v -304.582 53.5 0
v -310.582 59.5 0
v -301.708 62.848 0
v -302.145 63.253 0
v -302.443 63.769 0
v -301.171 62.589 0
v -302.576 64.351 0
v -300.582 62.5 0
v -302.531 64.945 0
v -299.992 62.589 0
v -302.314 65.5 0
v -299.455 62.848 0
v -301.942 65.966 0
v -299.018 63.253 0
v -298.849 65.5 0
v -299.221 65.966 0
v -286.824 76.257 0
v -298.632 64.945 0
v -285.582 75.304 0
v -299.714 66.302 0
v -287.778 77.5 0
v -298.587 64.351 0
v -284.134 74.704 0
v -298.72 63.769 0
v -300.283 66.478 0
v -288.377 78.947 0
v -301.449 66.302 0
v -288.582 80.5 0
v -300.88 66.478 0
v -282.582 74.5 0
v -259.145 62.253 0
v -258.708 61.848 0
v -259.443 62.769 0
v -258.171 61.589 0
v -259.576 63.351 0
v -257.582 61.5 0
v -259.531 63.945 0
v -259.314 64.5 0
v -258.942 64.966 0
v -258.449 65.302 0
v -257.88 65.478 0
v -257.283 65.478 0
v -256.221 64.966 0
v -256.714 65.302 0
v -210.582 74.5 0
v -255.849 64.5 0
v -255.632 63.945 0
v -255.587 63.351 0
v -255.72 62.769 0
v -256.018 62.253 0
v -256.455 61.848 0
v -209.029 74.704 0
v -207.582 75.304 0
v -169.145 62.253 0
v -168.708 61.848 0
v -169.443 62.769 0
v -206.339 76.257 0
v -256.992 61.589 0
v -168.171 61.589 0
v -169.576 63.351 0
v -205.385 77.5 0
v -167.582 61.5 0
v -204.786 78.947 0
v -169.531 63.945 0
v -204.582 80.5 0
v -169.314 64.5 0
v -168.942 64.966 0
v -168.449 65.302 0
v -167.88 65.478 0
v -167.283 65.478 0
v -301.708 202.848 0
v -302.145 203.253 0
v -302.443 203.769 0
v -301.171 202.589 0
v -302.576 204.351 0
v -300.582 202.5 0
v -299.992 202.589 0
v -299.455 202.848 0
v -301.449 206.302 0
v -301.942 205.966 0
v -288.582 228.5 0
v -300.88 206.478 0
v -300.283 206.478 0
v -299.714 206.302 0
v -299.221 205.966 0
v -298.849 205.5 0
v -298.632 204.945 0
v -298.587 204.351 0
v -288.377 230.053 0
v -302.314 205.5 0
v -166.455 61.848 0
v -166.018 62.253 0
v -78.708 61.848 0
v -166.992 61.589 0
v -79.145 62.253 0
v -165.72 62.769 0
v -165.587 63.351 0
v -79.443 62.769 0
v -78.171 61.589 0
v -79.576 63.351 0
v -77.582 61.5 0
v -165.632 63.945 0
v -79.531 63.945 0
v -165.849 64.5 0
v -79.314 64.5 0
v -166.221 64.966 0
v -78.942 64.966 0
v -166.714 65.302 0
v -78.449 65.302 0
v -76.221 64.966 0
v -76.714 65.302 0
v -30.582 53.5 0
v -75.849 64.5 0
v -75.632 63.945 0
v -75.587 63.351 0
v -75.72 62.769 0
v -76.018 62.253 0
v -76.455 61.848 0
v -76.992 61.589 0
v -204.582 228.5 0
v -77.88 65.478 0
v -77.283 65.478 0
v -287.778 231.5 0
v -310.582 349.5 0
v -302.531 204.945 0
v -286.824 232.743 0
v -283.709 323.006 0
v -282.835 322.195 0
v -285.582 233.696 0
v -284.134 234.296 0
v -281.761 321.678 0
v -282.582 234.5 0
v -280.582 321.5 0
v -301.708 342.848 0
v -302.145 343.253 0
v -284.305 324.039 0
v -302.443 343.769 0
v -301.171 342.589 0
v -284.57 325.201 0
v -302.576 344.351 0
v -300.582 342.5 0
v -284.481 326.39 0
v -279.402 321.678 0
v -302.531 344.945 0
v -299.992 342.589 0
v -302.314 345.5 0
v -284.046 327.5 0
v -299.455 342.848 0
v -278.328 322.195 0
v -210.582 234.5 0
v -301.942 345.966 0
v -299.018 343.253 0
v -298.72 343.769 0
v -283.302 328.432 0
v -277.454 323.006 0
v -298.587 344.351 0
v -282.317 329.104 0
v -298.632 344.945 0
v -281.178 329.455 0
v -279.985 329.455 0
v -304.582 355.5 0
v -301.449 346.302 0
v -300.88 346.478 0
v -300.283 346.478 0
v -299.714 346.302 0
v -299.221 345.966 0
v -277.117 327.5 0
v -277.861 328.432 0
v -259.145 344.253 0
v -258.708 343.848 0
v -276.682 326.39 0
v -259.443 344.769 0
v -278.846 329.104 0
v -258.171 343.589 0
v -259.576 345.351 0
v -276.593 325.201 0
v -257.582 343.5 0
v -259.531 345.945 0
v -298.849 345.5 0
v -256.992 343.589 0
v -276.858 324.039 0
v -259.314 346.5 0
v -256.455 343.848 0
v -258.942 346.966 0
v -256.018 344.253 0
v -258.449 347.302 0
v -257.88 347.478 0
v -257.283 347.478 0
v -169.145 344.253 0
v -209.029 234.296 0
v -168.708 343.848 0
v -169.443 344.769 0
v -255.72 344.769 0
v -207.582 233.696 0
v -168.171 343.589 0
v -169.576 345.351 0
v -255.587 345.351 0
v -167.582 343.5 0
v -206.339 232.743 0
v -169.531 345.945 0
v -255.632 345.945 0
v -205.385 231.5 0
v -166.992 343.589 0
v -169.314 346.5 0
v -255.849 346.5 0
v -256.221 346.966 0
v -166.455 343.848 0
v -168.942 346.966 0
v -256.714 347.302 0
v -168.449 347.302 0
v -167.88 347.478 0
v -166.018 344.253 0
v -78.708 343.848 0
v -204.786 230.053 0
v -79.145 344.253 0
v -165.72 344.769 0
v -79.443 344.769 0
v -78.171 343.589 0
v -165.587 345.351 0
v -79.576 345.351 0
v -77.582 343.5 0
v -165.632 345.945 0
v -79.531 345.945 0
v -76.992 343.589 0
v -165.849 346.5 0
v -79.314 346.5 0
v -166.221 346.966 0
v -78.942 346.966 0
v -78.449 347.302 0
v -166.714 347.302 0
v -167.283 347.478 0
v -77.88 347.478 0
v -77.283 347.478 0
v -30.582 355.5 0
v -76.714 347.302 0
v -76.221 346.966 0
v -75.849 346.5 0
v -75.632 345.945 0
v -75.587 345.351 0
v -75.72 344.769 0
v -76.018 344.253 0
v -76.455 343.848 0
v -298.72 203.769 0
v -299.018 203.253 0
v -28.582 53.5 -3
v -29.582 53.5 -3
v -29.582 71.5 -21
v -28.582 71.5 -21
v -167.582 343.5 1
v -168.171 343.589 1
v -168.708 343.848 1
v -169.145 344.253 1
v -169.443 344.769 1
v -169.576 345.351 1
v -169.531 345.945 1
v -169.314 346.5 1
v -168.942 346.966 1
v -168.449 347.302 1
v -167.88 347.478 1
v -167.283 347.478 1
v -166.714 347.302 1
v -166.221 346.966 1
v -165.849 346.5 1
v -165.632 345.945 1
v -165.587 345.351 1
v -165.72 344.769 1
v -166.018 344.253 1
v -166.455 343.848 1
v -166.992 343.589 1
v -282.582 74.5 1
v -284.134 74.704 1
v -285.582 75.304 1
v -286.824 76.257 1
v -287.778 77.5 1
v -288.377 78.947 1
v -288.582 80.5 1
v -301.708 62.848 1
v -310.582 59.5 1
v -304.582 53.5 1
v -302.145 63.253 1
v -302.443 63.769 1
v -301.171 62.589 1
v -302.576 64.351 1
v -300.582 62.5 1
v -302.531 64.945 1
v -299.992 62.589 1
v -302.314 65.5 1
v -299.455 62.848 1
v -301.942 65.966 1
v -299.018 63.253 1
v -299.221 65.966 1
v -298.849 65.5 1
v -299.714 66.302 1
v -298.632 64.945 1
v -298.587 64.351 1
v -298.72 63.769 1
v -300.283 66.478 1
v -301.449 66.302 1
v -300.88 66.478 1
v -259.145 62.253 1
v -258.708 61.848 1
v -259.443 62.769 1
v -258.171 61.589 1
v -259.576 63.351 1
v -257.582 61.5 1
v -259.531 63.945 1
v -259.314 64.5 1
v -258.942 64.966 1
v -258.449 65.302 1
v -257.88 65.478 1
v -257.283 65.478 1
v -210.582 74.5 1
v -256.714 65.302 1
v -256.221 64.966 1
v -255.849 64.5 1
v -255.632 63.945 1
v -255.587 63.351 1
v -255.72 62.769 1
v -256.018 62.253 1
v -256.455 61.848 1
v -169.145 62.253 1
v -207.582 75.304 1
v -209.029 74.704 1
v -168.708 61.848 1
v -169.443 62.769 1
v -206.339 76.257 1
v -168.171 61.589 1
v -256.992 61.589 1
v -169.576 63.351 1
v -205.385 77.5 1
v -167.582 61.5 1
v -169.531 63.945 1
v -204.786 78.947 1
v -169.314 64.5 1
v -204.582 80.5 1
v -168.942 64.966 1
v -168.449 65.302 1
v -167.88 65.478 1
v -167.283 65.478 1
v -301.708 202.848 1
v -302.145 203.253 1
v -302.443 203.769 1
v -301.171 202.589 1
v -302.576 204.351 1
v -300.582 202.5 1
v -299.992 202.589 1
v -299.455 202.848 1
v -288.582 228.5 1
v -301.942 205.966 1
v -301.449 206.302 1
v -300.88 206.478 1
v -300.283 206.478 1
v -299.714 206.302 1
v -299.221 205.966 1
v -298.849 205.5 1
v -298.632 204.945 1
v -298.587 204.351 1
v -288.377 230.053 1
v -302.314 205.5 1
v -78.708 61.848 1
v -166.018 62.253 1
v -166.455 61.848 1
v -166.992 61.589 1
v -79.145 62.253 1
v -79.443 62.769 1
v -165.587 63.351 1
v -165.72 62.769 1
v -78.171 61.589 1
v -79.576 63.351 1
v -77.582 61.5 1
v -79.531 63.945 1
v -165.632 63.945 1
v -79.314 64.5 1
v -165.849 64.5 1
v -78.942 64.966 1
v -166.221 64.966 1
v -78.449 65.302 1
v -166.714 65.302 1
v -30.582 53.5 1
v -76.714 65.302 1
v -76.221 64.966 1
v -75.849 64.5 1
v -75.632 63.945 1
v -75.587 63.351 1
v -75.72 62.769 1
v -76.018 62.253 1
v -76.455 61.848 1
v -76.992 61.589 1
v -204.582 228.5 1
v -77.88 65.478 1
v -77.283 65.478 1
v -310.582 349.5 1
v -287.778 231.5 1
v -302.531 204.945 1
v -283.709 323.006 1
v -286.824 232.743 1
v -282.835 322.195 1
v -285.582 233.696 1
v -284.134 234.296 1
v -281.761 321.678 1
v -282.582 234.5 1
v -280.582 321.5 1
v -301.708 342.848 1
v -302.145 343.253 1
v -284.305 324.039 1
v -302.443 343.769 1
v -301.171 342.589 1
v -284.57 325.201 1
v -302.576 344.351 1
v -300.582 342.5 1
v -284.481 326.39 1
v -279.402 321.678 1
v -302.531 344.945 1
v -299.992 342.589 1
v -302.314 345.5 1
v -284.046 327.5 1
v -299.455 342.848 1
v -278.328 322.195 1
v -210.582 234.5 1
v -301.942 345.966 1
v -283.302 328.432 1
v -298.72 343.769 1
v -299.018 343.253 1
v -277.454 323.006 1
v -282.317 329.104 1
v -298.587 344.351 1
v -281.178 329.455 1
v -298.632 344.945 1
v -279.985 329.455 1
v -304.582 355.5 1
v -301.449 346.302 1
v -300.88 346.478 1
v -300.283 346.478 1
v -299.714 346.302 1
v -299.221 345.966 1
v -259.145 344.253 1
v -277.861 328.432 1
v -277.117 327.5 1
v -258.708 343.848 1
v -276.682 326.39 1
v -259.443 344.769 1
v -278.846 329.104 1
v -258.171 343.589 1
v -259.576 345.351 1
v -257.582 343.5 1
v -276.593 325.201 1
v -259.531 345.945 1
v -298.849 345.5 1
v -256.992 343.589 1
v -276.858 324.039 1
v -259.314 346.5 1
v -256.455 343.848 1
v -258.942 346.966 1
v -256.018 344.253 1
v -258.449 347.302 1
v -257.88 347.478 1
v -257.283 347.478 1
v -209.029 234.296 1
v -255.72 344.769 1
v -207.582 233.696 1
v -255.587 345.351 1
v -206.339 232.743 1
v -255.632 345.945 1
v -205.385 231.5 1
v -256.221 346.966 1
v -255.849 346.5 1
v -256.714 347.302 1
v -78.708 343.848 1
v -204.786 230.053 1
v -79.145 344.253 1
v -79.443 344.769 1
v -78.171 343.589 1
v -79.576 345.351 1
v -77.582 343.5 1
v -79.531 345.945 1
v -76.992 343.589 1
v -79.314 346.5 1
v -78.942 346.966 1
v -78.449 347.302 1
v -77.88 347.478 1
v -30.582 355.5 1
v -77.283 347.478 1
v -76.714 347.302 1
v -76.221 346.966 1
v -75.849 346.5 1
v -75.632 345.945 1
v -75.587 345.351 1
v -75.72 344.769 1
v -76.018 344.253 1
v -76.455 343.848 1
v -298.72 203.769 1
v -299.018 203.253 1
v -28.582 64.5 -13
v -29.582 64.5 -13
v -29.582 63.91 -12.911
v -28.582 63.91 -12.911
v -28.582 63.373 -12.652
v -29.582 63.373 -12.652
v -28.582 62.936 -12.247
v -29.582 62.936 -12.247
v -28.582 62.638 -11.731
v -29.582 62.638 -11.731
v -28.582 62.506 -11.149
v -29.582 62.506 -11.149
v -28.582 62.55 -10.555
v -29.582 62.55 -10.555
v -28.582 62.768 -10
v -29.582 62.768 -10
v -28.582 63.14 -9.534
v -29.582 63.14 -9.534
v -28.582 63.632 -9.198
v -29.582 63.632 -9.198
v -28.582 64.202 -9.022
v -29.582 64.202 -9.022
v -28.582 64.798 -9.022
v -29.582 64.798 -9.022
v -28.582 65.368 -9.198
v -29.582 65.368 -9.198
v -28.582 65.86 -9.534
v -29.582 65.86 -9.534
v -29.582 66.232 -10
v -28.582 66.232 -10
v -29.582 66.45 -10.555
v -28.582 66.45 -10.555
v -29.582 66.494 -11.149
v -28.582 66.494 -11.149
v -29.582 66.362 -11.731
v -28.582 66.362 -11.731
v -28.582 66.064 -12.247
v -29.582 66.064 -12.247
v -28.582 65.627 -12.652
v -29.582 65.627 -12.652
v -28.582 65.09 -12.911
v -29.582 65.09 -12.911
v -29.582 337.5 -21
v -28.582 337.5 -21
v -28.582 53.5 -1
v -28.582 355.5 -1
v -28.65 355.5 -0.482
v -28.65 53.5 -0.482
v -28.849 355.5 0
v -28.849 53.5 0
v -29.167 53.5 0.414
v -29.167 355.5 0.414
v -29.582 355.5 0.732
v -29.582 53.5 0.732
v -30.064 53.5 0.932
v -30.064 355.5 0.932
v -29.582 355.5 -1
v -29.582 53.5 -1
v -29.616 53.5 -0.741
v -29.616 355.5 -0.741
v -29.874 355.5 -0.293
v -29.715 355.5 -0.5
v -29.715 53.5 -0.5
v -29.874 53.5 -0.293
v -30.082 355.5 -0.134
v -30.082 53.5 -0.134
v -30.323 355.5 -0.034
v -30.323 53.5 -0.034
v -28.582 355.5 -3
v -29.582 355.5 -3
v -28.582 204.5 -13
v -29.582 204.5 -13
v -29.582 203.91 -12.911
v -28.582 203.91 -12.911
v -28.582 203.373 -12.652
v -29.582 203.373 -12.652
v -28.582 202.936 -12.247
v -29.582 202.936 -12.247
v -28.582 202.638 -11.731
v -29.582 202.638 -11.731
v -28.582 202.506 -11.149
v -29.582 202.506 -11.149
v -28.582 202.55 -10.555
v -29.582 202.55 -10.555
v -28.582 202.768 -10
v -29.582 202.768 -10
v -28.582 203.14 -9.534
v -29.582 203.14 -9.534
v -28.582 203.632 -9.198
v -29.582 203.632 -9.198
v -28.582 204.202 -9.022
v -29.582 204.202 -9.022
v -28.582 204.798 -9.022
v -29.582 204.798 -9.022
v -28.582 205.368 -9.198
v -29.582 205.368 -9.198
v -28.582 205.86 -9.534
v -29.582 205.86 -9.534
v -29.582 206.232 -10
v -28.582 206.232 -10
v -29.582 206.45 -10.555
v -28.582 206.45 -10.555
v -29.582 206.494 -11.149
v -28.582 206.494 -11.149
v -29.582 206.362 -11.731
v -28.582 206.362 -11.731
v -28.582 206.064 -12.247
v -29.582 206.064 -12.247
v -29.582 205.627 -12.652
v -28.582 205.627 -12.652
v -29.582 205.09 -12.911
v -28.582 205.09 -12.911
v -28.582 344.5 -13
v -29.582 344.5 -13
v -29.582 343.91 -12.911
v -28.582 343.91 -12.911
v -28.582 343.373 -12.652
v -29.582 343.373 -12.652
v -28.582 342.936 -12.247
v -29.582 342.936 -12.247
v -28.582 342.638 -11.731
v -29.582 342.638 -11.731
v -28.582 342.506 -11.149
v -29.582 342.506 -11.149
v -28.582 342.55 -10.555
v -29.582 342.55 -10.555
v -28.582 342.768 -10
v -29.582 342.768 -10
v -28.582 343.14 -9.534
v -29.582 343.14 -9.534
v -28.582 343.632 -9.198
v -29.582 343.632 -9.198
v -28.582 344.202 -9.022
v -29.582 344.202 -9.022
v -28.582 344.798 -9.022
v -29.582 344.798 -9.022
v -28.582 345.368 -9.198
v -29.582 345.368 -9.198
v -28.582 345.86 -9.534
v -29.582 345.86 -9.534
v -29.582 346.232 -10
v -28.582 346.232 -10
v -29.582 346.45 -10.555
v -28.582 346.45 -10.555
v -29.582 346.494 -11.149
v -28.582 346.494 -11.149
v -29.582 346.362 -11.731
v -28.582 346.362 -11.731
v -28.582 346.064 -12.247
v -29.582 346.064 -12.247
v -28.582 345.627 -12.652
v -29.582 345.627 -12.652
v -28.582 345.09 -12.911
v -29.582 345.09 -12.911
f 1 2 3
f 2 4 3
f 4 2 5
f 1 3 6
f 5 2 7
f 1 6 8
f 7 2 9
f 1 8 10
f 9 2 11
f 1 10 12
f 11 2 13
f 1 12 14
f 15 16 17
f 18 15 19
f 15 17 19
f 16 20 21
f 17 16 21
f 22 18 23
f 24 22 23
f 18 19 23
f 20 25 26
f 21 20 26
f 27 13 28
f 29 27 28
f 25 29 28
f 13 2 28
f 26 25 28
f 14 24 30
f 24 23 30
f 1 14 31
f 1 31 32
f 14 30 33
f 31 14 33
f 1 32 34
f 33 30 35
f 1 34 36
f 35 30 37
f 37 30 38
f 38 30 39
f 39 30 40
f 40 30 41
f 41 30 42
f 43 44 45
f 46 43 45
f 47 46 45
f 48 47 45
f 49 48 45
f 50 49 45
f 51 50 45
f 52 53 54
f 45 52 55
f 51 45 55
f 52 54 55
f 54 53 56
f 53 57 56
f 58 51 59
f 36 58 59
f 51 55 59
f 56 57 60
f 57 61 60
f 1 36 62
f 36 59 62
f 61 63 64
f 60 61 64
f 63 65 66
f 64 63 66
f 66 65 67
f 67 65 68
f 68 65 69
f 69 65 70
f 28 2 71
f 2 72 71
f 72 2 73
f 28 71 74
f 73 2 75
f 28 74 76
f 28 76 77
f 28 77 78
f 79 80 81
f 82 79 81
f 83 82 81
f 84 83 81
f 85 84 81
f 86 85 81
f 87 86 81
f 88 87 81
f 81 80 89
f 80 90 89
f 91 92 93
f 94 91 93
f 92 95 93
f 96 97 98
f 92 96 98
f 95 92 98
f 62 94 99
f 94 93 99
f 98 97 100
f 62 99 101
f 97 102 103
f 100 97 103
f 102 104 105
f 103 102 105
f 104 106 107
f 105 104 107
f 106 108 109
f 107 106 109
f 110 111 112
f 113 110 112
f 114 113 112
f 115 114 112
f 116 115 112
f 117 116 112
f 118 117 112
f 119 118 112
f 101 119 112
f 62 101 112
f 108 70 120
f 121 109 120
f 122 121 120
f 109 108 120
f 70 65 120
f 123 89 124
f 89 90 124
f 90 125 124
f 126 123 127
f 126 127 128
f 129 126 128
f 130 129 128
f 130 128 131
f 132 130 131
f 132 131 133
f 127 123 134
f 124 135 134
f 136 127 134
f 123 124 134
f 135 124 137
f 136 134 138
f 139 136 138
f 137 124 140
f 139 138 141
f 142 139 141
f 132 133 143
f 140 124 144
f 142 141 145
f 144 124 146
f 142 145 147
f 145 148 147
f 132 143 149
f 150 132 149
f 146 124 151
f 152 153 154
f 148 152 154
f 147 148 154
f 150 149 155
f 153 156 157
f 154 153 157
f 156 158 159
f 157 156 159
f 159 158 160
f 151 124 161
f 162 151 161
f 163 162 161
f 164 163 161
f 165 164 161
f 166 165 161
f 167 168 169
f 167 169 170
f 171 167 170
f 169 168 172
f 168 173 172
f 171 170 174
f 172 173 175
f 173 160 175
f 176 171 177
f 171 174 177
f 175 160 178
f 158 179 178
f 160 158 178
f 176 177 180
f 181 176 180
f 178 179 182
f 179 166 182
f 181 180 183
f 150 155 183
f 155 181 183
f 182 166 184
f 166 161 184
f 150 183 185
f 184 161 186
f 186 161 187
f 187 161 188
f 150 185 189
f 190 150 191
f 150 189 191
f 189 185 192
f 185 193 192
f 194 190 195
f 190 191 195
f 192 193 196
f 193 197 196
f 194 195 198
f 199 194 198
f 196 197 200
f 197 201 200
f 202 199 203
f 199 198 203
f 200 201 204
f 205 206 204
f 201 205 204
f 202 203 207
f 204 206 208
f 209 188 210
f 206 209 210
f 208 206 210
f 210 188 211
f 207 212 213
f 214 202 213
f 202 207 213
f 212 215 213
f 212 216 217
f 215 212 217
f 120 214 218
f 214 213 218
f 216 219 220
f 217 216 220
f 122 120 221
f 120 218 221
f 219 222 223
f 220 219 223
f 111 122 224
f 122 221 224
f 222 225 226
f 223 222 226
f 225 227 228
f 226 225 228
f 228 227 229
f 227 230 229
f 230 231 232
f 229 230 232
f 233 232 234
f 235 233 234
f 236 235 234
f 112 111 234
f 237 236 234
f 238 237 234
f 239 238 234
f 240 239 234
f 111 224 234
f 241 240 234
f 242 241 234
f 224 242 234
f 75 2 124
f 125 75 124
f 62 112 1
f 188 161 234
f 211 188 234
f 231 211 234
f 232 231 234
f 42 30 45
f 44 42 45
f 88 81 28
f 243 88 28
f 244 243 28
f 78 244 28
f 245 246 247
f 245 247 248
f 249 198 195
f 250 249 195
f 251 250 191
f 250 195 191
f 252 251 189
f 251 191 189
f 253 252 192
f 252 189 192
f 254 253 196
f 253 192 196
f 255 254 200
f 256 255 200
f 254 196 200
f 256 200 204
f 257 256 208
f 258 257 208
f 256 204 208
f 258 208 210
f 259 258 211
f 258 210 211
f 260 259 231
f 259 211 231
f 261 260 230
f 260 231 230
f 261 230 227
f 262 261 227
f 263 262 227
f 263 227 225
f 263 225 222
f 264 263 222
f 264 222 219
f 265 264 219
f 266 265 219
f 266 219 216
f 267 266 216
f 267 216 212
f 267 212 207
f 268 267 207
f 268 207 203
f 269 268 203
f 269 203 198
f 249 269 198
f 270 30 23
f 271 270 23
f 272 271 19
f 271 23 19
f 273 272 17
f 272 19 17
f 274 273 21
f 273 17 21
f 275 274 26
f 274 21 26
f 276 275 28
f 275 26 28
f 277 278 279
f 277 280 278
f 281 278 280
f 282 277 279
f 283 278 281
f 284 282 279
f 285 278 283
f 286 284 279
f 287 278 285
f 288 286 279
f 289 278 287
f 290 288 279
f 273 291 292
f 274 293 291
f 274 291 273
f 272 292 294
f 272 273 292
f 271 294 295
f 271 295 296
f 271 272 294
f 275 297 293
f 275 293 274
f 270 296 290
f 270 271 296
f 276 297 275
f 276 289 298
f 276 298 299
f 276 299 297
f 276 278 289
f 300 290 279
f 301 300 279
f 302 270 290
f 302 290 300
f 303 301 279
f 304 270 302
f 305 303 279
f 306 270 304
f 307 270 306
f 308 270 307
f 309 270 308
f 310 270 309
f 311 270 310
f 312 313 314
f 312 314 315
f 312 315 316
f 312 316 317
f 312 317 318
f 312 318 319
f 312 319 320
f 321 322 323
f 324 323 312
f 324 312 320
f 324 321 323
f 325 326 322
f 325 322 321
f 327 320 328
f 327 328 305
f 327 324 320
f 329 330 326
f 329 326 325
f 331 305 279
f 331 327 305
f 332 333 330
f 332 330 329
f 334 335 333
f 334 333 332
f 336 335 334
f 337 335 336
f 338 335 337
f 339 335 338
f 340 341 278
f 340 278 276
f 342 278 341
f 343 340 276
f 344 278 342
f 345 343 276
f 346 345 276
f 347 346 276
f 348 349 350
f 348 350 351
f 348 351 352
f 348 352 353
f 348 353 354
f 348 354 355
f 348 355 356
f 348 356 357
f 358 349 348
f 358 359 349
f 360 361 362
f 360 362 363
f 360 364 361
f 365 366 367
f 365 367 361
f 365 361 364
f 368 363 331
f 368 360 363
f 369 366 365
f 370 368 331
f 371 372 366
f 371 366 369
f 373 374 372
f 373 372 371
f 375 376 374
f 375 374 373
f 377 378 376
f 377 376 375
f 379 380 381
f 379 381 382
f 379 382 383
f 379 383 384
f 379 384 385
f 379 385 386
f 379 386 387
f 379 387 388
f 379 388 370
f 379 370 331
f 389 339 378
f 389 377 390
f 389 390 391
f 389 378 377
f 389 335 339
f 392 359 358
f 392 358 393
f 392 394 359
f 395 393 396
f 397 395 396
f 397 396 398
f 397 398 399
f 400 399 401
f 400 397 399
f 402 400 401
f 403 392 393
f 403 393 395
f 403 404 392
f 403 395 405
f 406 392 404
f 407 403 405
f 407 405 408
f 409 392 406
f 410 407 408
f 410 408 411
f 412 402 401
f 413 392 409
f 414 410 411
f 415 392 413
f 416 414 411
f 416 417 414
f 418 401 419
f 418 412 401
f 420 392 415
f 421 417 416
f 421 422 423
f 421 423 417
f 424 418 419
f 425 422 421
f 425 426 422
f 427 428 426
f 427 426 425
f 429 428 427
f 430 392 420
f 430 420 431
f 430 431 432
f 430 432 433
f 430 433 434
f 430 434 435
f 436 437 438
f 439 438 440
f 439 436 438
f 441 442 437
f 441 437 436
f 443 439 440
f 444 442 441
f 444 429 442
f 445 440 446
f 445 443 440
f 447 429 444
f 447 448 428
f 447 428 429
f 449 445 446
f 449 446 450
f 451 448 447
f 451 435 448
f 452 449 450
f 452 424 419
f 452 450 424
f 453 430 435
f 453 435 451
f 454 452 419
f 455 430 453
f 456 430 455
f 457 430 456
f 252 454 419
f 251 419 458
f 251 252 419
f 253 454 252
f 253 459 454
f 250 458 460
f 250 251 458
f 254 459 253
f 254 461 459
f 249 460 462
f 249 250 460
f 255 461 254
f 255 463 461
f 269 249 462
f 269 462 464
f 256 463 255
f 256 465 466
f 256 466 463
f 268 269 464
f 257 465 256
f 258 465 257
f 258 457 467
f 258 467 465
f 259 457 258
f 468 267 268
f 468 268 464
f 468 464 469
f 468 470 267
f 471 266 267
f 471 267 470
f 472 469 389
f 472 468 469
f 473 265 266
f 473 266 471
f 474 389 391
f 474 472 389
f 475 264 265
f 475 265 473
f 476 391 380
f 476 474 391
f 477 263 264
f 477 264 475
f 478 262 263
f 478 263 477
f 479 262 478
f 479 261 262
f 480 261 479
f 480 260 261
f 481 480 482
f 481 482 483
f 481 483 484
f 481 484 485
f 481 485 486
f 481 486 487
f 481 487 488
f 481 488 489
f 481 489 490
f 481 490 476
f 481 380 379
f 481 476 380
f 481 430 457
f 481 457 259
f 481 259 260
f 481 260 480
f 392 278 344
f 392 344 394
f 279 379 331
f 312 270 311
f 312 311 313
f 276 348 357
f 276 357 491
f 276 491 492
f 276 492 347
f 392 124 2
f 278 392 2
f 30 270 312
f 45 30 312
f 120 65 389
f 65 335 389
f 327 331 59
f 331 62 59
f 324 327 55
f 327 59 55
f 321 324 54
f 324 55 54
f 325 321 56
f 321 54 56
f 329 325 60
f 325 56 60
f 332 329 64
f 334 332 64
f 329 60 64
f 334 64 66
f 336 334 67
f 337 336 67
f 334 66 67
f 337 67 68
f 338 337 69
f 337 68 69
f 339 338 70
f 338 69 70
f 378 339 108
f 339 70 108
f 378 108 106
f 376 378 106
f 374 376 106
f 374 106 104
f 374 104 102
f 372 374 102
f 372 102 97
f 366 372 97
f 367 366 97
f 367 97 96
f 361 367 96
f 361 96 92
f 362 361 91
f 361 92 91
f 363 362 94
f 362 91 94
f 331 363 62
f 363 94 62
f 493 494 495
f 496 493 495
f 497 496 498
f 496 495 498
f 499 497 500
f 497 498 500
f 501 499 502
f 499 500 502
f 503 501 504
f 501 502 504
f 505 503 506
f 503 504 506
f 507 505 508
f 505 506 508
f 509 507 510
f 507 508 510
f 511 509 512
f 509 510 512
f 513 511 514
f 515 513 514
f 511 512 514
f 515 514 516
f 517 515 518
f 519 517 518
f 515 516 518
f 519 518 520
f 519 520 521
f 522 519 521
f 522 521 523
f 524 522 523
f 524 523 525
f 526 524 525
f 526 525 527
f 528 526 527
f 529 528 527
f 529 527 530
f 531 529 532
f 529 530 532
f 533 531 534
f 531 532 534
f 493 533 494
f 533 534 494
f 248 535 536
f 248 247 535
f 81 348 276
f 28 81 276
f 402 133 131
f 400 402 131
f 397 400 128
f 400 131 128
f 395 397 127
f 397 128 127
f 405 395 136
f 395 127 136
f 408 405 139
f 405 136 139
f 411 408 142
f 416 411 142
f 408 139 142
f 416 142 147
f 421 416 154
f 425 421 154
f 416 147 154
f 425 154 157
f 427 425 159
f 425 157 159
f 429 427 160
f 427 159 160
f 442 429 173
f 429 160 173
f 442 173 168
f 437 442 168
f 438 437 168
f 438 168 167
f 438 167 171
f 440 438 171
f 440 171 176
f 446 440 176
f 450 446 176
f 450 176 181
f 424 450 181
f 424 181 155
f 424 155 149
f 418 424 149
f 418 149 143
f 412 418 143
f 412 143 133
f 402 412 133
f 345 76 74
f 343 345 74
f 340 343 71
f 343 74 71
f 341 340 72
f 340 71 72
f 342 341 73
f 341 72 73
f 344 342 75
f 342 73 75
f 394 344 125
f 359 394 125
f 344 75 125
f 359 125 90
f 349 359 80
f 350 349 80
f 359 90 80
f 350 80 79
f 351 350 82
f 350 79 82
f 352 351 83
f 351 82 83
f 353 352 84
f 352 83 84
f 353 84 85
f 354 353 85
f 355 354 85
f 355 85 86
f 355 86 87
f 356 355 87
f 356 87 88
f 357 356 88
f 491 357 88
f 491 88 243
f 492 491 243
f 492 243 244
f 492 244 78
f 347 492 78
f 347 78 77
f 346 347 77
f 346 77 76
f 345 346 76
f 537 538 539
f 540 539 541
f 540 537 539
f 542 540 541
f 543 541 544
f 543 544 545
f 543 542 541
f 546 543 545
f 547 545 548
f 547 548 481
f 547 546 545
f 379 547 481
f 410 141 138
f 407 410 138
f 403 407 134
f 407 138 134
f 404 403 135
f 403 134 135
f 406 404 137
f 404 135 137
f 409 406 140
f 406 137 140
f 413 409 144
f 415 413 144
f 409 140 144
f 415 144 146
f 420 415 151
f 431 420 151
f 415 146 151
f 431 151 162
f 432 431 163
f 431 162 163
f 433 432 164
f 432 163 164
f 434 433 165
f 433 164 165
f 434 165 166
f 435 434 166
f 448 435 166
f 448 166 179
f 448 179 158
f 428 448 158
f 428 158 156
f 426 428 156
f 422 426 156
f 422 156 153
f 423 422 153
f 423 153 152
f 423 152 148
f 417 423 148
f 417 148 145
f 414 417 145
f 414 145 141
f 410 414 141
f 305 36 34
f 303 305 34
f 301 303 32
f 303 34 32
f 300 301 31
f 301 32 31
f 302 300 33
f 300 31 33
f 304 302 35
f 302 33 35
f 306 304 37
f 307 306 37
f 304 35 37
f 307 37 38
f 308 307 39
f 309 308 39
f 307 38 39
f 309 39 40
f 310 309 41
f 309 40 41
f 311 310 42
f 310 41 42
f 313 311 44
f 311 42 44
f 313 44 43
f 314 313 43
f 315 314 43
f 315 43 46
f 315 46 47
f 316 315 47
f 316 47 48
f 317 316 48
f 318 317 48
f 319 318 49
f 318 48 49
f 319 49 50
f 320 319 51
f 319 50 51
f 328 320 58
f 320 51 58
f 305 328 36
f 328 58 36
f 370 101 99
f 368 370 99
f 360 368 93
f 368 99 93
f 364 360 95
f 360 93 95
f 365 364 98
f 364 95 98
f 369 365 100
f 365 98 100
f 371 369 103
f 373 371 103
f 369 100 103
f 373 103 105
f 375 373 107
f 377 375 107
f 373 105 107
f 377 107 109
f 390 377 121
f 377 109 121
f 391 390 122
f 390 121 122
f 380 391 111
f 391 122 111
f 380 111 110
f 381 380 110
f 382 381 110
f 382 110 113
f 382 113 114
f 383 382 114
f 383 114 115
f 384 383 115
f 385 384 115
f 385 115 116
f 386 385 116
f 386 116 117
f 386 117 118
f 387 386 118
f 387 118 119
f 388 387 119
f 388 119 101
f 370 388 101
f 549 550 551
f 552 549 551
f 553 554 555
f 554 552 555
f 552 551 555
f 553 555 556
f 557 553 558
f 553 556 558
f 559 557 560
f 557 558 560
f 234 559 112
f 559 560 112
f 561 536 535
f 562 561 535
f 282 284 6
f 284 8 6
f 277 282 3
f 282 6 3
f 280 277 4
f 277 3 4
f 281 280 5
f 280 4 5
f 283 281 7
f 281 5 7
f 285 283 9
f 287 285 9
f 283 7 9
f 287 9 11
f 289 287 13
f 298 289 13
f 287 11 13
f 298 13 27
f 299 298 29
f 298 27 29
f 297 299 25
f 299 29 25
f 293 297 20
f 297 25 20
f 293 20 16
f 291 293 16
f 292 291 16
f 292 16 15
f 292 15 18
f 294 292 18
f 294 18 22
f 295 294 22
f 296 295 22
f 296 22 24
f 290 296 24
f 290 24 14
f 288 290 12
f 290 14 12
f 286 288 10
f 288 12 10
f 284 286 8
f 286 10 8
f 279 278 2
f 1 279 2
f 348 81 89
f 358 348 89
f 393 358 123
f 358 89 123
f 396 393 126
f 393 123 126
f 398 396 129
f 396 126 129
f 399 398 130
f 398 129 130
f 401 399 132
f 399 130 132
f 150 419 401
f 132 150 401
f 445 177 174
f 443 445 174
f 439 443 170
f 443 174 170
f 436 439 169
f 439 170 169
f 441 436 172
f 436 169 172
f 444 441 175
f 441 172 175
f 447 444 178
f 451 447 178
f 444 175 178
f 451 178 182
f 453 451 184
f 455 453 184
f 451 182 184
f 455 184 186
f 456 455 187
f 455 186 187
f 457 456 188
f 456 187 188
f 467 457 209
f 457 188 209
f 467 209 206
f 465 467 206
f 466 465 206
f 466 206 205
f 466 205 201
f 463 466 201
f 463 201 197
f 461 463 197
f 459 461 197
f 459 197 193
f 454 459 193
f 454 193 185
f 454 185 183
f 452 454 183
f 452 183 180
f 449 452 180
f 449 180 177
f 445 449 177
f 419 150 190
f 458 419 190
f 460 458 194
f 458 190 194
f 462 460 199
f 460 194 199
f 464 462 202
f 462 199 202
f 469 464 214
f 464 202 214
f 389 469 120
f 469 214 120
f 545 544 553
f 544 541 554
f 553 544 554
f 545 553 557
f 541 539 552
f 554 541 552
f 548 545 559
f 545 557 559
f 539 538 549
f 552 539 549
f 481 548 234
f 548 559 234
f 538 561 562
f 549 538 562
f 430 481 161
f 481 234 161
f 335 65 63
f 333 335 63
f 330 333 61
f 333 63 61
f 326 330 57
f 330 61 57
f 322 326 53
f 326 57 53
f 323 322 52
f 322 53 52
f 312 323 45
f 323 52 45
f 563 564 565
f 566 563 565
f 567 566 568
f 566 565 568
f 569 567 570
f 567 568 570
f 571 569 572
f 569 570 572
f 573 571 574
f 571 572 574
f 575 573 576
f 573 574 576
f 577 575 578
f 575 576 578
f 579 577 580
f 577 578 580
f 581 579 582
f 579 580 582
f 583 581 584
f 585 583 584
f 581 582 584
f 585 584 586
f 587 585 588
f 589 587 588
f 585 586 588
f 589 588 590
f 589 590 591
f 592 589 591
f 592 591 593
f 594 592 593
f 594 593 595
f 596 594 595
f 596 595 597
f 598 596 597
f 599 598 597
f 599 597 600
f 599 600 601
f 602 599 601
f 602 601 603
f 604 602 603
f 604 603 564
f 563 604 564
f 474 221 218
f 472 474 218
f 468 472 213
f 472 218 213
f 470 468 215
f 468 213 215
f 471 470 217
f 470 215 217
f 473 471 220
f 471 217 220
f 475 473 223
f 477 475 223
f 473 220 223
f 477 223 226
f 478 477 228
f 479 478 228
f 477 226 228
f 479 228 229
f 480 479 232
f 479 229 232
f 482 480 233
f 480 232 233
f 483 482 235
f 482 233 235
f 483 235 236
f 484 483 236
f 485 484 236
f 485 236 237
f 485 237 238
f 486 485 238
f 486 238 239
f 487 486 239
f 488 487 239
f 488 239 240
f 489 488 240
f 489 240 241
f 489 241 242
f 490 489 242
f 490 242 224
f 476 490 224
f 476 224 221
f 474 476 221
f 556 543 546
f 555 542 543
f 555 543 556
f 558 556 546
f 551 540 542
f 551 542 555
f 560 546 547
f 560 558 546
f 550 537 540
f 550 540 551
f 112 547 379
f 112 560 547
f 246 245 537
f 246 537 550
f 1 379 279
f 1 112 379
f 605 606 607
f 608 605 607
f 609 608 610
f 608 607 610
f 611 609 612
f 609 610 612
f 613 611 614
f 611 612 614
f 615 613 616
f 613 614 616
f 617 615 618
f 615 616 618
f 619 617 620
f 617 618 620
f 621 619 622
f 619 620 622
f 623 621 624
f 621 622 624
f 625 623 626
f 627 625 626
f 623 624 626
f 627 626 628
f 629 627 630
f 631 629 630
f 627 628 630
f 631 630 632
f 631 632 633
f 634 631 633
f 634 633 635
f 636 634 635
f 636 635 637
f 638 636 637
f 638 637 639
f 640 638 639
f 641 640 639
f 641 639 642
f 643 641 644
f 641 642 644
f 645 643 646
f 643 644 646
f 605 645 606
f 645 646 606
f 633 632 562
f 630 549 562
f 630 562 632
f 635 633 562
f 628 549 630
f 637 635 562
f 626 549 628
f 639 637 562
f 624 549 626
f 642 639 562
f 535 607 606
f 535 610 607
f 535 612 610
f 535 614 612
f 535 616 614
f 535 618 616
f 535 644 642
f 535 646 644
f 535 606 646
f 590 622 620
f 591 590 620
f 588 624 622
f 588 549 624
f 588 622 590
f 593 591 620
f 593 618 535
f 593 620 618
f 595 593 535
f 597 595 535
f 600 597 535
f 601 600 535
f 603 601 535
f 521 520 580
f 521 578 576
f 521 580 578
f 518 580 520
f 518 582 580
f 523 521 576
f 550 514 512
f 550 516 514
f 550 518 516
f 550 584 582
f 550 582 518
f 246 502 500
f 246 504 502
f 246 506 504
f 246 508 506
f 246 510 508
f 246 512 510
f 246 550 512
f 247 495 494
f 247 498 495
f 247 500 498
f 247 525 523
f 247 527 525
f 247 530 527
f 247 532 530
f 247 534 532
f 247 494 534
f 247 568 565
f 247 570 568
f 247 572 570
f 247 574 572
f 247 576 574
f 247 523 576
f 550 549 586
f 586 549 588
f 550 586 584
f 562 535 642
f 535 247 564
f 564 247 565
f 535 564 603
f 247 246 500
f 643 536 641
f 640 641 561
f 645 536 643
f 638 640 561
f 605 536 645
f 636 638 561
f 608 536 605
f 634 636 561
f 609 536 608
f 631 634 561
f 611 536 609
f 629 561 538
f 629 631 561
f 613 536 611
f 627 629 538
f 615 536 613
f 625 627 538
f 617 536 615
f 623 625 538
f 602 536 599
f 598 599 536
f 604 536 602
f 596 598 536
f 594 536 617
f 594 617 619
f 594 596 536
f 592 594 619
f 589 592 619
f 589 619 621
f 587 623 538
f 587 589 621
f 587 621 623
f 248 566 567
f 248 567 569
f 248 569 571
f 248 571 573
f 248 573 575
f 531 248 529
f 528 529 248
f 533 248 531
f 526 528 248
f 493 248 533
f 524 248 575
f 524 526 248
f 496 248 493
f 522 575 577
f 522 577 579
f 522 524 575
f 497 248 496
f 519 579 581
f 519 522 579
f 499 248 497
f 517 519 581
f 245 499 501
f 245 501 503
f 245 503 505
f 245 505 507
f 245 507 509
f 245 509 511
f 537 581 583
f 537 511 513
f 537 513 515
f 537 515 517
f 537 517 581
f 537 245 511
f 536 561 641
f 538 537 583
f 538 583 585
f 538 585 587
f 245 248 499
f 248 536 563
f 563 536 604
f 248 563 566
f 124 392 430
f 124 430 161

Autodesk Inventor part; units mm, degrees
ref_plane "YZ Plane" through (0, 0, 0) normal (1, 0, 0) x (0, 1, 0)
ref_plane "XZ Plane" through (0, 0, 0) normal (0, 1, 0) x (-1, 0, 0)
ref_plane "XY Plane" through (0, 0, 0) normal (0, 0, 1) x (1, 0, 0)
sketch "Sketch1" plane through (0, 0, 0) normal (0, 0, 1) x (1, 0, 0)
  line L0 (-29.5815, 53.7121) -> (-29.5815, 355.2879)
  line L1 (-329.5815, 355.5) -> (-54.5815, 355.5)
  line L2 (-329.5815, 53.5) -> (-54.5815, 53.5)
  line L3 (-310.5815, 334.5) -> (-310.5815, 74.5)
  line L4 (-29.5815, 355.5) -> (-310.5815, 355.5)
  line L5 (-310.5815, 355.5) -> (-310.5815, 53.5)
  line L6 (-310.5815, 53.5) -> (-29.5815, 53.5)
  line L7 (-29.5815, 53.5) -> (-29.5815, 355.5)
  point P0 (0, 0)
extrude "Plate1" add sketch "Sketch1" along normal blind 1
sketch "Sketch2" plane through (-29.5815, 53.5, 0) normal (1, 0, 0) x (0, 1, 0)
  line L0 (302, 0) -> (0, 0)
  line L1 (0, 0) -> (0, -21)
  line L2 (0, -21) -> (302, -21)
  line L3 (302, -21) -> (302, 0)
edge flange "Flange1" height 22 angle 90 thickness 1 bend radius 1 thickness toward (1, 0, 0) relief tear relief width 1 relief depth 0.5 edges at (-29.5815, 204.5, 0) wall of the first edge with corners at (-29.5815, 355.5, 0) (-29.5815, 53.5, 0) (-29.5815, 53.5, -21) (-29.5815, 355.5, -21)
bend "Bend1"
corner "Corner1"
chamfer "Corner Chamfer1" distance 18 angle 45 1 edges at (-29.0815, 355.5, -21)
chamfer "Corner Chamfer2" distance 18 angle 45 1 edges at (-29.0815, 53.5, -21)
chamfer "Corner Chamfer3" distance 6 angle 45 2 edges at (-310.5815, 355.5, 0.5) (-310.5815, 53.5, 0.5)
sketch "Sketch3" plane through (0, 0, 1) normal (0, 0, 1) x (1, 0, 0)
  line L0 (-310.5815, 59.5) -> (-310.5815, 349.5) projected
  line L1 (-304.5815, 355.5) -> (-30.5815, 355.5) projected
  line L2 (-304.5815, 53.5) -> (-30.5815, 53.5) projected
  point P0 (0, 0)
  point P1 (-77.5815, 345.5)
  point P2 (-167.5815, 345.5)
  point P3 (-257.5815, 345.5)
  point P4 (-300.5815, 344.5)
  point P5 (-300.5815, 204.5)
  point P6 (-300.5815, 64.5)
  point P7 (-257.5815, 63.5)
  point P8 (-167.5815, 63.5)
  point P9 (-77.5815, 63.5)
  point P10 (-310.5815, 204.5)
  point P11 (-167.5815, 355.5)
  dimension "d20" = 90
  dimension "d21" = 90
  dimension "d22" = 10
  dimension "d23" = 10
  dimension "d24" = 140
  dimension "d25" = 140
  dimension "d26" = 10
hole "Hole1" at (-77.5815, 345.5, 1) at (-167.5815, 345.5, 1) at (-257.5815, 345.5, 1) at (-300.5815, 344.5, 1) at (-300.5815, 204.5, 1) at (-300.5815, 64.5, 1) at (-257.5815, 63.5, 1) at (-167.5815, 63.5, 1) at (-77.5815, 63.5, 1) direction (0, 0, -1) diameter 4 depth 1 tip angle 118
sketch "Sketch4" plane through (-28.5815, 53.5, -1) normal (1, 0, 0) x (0, 0, -1)
  line L0 (20, 284) -> (20, 18) projected
  point P0 (-1, -53.5)
  point P1 (10, 291)
  point P2 (10, 151)
  point P3 (10, 11)
  point P4 (20, 151)
  dimension "d34" = 10
  dimension "d35" = 140
  dimension "d36" = 140
hole "Hole2" at (-28.5815, 344.5, -11) at (-28.5815, 204.5, -11) at (-28.5815, 64.5, -11) direction (-1, 0, 0) diameter 4 depth 1 tip angle 118
sketch "Sketch5" plane through (0, 0, 1) normal (0, 0, 1) x (1, 0, 0)
  line L0 (-288.5815, 83.5) -> (-288.5815, 325.5) projected
  line L1 (-329.5815, 74.5) -> (-54.5815, 74.5) projected
  line L2 (-204.5815, 234.5) -> (-288.5815, 234.5)
  line L3 (-288.5815, 234.5) -> (-288.5815, 74.5)
  line L4 (-288.5815, 74.5) -> (-204.5815, 74.5)
  line L5 (-204.5815, 74.5) -> (-204.5815, 234.5)
  point P0 (0, 0)
  dimension "d44" = 84
  dimension "d45" = 160
extrude "Cut1" cut sketch "Sketch5" against normal blind 1
fillet "Corner Round1" radius 6 4 edges at (-204.5815, 234.5, 0.5) (-288.5815, 234.5, 0.5) (-204.5815, 74.5, 0.5) (-288.5815, 74.5, 0.5)
sketch "Sketch6" plane through (0, 0, 1) normal (0, 0, 1) x (1, 0, 0)
  line L0 (-304.5815, 355.5) -> (-30.5815, 355.5) projected
  line L1 (-310.5815, 349.5) -> (-310.5815, 59.5) projected
  point P0 (0, 0)
  point P1 (-280.5815, 325.5)
  dimension "d49" = 30
  dimension "d50" = 30
hole "Hole3" at (-280.5815, 325.5, 1) direction (0, 0, -1) diameter 8 depth 1 tip angle 118
equation "\"d21\" = d20"
equation "\"d25\" = d24"
equation "\"d32\" = Thickness"
equation "\"d36\" = d35"
equation "\"d42\" = Thickness"
equation "\"d46\" = Thickness"
equation "\"d56\" = Thickness"
equation "\"d1\" = BendReliefWidth"
equation "\"d2\" = BendReliefDepth"
equation "\"d3\" = MinimumRemnant"
equation "\"d4\" = BendRadius"
equation "\"d7\" = BendRadius"
equation "\"d8\" = CornerReliefSize"
equation "\"d9\" = GapSize"
equation "\"d10\" = JacobiRadiusSize"
equation "\"BendRadius\" = Thickness"
equation "\"BendReliefWidth\" = Thickness"
equation "\"BendReliefDepth\" = 0.5 * Thickness"
equation "\"CornerReliefSize\" = 4 * Thickness"
equation "\"MinimumRemnant\" = 2 * Thickness"
equation "\"TransitionRadius\" = BendRadius"
equation "\"JacobiRadiusSize\" = BendRadius"
equation "\"GapSize\" = Thickness"
equation "\"d0\" = BendRadius"
equation "\"Thickness\" = 1"
properties part number "sheetblack"
